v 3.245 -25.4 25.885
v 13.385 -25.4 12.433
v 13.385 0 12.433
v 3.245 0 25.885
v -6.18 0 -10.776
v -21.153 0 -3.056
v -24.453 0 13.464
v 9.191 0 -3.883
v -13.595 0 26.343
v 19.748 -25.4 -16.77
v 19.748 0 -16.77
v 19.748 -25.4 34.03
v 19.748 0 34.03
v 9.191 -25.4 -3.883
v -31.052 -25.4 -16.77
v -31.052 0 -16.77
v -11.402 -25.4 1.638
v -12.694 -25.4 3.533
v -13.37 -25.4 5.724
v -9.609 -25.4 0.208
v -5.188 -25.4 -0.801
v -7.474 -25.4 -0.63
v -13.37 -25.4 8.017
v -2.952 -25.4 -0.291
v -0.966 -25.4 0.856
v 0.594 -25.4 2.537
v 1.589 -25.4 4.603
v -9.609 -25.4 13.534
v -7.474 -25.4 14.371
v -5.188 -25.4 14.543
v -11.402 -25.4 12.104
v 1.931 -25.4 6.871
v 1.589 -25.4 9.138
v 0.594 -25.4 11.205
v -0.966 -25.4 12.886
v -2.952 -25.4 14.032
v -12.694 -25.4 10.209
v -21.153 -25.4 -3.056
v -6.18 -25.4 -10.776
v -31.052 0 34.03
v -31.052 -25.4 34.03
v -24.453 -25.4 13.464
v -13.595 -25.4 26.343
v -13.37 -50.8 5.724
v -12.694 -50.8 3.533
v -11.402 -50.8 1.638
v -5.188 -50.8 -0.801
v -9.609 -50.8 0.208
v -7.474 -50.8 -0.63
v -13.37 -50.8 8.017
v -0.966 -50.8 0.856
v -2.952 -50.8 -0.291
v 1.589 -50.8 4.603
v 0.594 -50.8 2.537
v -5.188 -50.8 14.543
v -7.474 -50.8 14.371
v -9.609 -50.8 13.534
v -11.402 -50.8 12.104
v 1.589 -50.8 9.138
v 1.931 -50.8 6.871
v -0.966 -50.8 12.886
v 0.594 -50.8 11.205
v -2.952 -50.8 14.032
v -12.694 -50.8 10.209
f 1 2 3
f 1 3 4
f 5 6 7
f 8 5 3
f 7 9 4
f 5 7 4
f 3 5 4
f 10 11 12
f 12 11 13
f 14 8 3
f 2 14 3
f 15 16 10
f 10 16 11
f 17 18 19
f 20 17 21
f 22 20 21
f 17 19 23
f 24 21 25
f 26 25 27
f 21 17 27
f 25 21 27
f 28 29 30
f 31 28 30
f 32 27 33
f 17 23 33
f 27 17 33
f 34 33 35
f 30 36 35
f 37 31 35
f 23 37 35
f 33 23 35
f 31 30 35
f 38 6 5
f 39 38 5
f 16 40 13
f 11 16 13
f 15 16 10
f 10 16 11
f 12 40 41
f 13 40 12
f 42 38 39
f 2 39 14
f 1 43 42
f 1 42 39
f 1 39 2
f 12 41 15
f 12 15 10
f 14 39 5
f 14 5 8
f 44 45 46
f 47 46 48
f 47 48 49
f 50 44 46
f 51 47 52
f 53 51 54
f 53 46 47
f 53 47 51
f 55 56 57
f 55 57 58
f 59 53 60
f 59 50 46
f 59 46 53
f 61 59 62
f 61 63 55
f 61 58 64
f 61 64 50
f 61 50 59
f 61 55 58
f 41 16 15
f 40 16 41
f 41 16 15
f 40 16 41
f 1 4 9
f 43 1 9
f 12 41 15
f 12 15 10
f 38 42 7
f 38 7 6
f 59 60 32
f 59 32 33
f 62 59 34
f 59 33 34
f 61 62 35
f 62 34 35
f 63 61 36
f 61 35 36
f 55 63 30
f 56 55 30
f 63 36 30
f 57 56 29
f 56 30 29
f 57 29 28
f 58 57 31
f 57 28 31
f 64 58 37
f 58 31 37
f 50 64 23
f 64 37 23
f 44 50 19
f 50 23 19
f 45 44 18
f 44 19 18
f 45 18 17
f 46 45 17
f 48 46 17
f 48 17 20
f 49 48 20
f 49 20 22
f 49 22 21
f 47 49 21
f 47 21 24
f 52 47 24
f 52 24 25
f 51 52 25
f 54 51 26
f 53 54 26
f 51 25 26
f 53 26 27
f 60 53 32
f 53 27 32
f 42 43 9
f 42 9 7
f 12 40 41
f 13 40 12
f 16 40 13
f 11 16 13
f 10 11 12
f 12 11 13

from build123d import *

# Parameters (mm, degrees)
F1_W     = 50.8
F1_H     = 50.8
F2_DEPTH = 25.4
F0_W     = 50.8
F0_H     = 50.8
F3_DEPTH = 25.4
F4_R     = 7.6936182882
F5_DEPTH = 25.4


with BuildPart() as f2:
    # F1 (on face) → F2 (new body)
    with BuildSketch(Plane.XZ):
        with Locations((-5.6516751647, 8.6300779854)):
            Rectangle(F1_W, F1_H)
        Polygon((-13.5950920682, 26.3433895766), (3.2445100648, 25.8845605331), (13.3851032709, 12.4327542039), (9.1906140355, -3.8825448783), (-6.1804216952, -10.7755837332), (-21.153300504, -3.0557635107), (-24.4531392567, 13.4637337061), align=None, mode=Mode.SUBTRACT)
        Polygon((13.3851032709, 12.4327542039), (3.2445100648, 25.8845605331), (-13.5950920682, 26.3433895766), (-24.4531392567, 13.4637337061), (-21.153300504, -3.0557635107), (-6.1804216952, -10.7755837332), (9.1906140355, -3.8825448783), align=None)
    extrude(amount=F2_DEPTH)


with BuildPart() as f2b:
    # F0 (on Front) → F2, piece 2 (new body)
    with BuildSketch(Plane.XZ):
        with Locations((-5.6516751647, 8.6300779854)):
            Rectangle(F0_W, F0_H)
    extrude(amount=F2_DEPTH)


with BuildPart() as f3:
    # F1 (on face) → F3 (new body)
    with BuildSketch(Plane.XZ):
        Polygon((13.3851032709, 12.4327542039), (3.2445100648, 25.8845605331), (-13.5950920682, 26.3433895766), (-24.4531392567, 13.4637337061), (-21.153300504, -3.0557635107), (-6.1804216952, -10.7755837332), (9.1906140355, -3.8825448783), align=None)
    extrude(amount=F3_DEPTH)


with BuildPart() as f5:
    # F4 (on face) → F5 (new body)
    with BuildSketch(Plane.XZ.offset(25.4)):
        with Locations((-5.7624927722, 6.8706646562)):
            Circle(F4_R)
    extrude(amount=F5_DEPTH)


solid = Compound([f2.part, f2b.part, f3.part, f5.part])
